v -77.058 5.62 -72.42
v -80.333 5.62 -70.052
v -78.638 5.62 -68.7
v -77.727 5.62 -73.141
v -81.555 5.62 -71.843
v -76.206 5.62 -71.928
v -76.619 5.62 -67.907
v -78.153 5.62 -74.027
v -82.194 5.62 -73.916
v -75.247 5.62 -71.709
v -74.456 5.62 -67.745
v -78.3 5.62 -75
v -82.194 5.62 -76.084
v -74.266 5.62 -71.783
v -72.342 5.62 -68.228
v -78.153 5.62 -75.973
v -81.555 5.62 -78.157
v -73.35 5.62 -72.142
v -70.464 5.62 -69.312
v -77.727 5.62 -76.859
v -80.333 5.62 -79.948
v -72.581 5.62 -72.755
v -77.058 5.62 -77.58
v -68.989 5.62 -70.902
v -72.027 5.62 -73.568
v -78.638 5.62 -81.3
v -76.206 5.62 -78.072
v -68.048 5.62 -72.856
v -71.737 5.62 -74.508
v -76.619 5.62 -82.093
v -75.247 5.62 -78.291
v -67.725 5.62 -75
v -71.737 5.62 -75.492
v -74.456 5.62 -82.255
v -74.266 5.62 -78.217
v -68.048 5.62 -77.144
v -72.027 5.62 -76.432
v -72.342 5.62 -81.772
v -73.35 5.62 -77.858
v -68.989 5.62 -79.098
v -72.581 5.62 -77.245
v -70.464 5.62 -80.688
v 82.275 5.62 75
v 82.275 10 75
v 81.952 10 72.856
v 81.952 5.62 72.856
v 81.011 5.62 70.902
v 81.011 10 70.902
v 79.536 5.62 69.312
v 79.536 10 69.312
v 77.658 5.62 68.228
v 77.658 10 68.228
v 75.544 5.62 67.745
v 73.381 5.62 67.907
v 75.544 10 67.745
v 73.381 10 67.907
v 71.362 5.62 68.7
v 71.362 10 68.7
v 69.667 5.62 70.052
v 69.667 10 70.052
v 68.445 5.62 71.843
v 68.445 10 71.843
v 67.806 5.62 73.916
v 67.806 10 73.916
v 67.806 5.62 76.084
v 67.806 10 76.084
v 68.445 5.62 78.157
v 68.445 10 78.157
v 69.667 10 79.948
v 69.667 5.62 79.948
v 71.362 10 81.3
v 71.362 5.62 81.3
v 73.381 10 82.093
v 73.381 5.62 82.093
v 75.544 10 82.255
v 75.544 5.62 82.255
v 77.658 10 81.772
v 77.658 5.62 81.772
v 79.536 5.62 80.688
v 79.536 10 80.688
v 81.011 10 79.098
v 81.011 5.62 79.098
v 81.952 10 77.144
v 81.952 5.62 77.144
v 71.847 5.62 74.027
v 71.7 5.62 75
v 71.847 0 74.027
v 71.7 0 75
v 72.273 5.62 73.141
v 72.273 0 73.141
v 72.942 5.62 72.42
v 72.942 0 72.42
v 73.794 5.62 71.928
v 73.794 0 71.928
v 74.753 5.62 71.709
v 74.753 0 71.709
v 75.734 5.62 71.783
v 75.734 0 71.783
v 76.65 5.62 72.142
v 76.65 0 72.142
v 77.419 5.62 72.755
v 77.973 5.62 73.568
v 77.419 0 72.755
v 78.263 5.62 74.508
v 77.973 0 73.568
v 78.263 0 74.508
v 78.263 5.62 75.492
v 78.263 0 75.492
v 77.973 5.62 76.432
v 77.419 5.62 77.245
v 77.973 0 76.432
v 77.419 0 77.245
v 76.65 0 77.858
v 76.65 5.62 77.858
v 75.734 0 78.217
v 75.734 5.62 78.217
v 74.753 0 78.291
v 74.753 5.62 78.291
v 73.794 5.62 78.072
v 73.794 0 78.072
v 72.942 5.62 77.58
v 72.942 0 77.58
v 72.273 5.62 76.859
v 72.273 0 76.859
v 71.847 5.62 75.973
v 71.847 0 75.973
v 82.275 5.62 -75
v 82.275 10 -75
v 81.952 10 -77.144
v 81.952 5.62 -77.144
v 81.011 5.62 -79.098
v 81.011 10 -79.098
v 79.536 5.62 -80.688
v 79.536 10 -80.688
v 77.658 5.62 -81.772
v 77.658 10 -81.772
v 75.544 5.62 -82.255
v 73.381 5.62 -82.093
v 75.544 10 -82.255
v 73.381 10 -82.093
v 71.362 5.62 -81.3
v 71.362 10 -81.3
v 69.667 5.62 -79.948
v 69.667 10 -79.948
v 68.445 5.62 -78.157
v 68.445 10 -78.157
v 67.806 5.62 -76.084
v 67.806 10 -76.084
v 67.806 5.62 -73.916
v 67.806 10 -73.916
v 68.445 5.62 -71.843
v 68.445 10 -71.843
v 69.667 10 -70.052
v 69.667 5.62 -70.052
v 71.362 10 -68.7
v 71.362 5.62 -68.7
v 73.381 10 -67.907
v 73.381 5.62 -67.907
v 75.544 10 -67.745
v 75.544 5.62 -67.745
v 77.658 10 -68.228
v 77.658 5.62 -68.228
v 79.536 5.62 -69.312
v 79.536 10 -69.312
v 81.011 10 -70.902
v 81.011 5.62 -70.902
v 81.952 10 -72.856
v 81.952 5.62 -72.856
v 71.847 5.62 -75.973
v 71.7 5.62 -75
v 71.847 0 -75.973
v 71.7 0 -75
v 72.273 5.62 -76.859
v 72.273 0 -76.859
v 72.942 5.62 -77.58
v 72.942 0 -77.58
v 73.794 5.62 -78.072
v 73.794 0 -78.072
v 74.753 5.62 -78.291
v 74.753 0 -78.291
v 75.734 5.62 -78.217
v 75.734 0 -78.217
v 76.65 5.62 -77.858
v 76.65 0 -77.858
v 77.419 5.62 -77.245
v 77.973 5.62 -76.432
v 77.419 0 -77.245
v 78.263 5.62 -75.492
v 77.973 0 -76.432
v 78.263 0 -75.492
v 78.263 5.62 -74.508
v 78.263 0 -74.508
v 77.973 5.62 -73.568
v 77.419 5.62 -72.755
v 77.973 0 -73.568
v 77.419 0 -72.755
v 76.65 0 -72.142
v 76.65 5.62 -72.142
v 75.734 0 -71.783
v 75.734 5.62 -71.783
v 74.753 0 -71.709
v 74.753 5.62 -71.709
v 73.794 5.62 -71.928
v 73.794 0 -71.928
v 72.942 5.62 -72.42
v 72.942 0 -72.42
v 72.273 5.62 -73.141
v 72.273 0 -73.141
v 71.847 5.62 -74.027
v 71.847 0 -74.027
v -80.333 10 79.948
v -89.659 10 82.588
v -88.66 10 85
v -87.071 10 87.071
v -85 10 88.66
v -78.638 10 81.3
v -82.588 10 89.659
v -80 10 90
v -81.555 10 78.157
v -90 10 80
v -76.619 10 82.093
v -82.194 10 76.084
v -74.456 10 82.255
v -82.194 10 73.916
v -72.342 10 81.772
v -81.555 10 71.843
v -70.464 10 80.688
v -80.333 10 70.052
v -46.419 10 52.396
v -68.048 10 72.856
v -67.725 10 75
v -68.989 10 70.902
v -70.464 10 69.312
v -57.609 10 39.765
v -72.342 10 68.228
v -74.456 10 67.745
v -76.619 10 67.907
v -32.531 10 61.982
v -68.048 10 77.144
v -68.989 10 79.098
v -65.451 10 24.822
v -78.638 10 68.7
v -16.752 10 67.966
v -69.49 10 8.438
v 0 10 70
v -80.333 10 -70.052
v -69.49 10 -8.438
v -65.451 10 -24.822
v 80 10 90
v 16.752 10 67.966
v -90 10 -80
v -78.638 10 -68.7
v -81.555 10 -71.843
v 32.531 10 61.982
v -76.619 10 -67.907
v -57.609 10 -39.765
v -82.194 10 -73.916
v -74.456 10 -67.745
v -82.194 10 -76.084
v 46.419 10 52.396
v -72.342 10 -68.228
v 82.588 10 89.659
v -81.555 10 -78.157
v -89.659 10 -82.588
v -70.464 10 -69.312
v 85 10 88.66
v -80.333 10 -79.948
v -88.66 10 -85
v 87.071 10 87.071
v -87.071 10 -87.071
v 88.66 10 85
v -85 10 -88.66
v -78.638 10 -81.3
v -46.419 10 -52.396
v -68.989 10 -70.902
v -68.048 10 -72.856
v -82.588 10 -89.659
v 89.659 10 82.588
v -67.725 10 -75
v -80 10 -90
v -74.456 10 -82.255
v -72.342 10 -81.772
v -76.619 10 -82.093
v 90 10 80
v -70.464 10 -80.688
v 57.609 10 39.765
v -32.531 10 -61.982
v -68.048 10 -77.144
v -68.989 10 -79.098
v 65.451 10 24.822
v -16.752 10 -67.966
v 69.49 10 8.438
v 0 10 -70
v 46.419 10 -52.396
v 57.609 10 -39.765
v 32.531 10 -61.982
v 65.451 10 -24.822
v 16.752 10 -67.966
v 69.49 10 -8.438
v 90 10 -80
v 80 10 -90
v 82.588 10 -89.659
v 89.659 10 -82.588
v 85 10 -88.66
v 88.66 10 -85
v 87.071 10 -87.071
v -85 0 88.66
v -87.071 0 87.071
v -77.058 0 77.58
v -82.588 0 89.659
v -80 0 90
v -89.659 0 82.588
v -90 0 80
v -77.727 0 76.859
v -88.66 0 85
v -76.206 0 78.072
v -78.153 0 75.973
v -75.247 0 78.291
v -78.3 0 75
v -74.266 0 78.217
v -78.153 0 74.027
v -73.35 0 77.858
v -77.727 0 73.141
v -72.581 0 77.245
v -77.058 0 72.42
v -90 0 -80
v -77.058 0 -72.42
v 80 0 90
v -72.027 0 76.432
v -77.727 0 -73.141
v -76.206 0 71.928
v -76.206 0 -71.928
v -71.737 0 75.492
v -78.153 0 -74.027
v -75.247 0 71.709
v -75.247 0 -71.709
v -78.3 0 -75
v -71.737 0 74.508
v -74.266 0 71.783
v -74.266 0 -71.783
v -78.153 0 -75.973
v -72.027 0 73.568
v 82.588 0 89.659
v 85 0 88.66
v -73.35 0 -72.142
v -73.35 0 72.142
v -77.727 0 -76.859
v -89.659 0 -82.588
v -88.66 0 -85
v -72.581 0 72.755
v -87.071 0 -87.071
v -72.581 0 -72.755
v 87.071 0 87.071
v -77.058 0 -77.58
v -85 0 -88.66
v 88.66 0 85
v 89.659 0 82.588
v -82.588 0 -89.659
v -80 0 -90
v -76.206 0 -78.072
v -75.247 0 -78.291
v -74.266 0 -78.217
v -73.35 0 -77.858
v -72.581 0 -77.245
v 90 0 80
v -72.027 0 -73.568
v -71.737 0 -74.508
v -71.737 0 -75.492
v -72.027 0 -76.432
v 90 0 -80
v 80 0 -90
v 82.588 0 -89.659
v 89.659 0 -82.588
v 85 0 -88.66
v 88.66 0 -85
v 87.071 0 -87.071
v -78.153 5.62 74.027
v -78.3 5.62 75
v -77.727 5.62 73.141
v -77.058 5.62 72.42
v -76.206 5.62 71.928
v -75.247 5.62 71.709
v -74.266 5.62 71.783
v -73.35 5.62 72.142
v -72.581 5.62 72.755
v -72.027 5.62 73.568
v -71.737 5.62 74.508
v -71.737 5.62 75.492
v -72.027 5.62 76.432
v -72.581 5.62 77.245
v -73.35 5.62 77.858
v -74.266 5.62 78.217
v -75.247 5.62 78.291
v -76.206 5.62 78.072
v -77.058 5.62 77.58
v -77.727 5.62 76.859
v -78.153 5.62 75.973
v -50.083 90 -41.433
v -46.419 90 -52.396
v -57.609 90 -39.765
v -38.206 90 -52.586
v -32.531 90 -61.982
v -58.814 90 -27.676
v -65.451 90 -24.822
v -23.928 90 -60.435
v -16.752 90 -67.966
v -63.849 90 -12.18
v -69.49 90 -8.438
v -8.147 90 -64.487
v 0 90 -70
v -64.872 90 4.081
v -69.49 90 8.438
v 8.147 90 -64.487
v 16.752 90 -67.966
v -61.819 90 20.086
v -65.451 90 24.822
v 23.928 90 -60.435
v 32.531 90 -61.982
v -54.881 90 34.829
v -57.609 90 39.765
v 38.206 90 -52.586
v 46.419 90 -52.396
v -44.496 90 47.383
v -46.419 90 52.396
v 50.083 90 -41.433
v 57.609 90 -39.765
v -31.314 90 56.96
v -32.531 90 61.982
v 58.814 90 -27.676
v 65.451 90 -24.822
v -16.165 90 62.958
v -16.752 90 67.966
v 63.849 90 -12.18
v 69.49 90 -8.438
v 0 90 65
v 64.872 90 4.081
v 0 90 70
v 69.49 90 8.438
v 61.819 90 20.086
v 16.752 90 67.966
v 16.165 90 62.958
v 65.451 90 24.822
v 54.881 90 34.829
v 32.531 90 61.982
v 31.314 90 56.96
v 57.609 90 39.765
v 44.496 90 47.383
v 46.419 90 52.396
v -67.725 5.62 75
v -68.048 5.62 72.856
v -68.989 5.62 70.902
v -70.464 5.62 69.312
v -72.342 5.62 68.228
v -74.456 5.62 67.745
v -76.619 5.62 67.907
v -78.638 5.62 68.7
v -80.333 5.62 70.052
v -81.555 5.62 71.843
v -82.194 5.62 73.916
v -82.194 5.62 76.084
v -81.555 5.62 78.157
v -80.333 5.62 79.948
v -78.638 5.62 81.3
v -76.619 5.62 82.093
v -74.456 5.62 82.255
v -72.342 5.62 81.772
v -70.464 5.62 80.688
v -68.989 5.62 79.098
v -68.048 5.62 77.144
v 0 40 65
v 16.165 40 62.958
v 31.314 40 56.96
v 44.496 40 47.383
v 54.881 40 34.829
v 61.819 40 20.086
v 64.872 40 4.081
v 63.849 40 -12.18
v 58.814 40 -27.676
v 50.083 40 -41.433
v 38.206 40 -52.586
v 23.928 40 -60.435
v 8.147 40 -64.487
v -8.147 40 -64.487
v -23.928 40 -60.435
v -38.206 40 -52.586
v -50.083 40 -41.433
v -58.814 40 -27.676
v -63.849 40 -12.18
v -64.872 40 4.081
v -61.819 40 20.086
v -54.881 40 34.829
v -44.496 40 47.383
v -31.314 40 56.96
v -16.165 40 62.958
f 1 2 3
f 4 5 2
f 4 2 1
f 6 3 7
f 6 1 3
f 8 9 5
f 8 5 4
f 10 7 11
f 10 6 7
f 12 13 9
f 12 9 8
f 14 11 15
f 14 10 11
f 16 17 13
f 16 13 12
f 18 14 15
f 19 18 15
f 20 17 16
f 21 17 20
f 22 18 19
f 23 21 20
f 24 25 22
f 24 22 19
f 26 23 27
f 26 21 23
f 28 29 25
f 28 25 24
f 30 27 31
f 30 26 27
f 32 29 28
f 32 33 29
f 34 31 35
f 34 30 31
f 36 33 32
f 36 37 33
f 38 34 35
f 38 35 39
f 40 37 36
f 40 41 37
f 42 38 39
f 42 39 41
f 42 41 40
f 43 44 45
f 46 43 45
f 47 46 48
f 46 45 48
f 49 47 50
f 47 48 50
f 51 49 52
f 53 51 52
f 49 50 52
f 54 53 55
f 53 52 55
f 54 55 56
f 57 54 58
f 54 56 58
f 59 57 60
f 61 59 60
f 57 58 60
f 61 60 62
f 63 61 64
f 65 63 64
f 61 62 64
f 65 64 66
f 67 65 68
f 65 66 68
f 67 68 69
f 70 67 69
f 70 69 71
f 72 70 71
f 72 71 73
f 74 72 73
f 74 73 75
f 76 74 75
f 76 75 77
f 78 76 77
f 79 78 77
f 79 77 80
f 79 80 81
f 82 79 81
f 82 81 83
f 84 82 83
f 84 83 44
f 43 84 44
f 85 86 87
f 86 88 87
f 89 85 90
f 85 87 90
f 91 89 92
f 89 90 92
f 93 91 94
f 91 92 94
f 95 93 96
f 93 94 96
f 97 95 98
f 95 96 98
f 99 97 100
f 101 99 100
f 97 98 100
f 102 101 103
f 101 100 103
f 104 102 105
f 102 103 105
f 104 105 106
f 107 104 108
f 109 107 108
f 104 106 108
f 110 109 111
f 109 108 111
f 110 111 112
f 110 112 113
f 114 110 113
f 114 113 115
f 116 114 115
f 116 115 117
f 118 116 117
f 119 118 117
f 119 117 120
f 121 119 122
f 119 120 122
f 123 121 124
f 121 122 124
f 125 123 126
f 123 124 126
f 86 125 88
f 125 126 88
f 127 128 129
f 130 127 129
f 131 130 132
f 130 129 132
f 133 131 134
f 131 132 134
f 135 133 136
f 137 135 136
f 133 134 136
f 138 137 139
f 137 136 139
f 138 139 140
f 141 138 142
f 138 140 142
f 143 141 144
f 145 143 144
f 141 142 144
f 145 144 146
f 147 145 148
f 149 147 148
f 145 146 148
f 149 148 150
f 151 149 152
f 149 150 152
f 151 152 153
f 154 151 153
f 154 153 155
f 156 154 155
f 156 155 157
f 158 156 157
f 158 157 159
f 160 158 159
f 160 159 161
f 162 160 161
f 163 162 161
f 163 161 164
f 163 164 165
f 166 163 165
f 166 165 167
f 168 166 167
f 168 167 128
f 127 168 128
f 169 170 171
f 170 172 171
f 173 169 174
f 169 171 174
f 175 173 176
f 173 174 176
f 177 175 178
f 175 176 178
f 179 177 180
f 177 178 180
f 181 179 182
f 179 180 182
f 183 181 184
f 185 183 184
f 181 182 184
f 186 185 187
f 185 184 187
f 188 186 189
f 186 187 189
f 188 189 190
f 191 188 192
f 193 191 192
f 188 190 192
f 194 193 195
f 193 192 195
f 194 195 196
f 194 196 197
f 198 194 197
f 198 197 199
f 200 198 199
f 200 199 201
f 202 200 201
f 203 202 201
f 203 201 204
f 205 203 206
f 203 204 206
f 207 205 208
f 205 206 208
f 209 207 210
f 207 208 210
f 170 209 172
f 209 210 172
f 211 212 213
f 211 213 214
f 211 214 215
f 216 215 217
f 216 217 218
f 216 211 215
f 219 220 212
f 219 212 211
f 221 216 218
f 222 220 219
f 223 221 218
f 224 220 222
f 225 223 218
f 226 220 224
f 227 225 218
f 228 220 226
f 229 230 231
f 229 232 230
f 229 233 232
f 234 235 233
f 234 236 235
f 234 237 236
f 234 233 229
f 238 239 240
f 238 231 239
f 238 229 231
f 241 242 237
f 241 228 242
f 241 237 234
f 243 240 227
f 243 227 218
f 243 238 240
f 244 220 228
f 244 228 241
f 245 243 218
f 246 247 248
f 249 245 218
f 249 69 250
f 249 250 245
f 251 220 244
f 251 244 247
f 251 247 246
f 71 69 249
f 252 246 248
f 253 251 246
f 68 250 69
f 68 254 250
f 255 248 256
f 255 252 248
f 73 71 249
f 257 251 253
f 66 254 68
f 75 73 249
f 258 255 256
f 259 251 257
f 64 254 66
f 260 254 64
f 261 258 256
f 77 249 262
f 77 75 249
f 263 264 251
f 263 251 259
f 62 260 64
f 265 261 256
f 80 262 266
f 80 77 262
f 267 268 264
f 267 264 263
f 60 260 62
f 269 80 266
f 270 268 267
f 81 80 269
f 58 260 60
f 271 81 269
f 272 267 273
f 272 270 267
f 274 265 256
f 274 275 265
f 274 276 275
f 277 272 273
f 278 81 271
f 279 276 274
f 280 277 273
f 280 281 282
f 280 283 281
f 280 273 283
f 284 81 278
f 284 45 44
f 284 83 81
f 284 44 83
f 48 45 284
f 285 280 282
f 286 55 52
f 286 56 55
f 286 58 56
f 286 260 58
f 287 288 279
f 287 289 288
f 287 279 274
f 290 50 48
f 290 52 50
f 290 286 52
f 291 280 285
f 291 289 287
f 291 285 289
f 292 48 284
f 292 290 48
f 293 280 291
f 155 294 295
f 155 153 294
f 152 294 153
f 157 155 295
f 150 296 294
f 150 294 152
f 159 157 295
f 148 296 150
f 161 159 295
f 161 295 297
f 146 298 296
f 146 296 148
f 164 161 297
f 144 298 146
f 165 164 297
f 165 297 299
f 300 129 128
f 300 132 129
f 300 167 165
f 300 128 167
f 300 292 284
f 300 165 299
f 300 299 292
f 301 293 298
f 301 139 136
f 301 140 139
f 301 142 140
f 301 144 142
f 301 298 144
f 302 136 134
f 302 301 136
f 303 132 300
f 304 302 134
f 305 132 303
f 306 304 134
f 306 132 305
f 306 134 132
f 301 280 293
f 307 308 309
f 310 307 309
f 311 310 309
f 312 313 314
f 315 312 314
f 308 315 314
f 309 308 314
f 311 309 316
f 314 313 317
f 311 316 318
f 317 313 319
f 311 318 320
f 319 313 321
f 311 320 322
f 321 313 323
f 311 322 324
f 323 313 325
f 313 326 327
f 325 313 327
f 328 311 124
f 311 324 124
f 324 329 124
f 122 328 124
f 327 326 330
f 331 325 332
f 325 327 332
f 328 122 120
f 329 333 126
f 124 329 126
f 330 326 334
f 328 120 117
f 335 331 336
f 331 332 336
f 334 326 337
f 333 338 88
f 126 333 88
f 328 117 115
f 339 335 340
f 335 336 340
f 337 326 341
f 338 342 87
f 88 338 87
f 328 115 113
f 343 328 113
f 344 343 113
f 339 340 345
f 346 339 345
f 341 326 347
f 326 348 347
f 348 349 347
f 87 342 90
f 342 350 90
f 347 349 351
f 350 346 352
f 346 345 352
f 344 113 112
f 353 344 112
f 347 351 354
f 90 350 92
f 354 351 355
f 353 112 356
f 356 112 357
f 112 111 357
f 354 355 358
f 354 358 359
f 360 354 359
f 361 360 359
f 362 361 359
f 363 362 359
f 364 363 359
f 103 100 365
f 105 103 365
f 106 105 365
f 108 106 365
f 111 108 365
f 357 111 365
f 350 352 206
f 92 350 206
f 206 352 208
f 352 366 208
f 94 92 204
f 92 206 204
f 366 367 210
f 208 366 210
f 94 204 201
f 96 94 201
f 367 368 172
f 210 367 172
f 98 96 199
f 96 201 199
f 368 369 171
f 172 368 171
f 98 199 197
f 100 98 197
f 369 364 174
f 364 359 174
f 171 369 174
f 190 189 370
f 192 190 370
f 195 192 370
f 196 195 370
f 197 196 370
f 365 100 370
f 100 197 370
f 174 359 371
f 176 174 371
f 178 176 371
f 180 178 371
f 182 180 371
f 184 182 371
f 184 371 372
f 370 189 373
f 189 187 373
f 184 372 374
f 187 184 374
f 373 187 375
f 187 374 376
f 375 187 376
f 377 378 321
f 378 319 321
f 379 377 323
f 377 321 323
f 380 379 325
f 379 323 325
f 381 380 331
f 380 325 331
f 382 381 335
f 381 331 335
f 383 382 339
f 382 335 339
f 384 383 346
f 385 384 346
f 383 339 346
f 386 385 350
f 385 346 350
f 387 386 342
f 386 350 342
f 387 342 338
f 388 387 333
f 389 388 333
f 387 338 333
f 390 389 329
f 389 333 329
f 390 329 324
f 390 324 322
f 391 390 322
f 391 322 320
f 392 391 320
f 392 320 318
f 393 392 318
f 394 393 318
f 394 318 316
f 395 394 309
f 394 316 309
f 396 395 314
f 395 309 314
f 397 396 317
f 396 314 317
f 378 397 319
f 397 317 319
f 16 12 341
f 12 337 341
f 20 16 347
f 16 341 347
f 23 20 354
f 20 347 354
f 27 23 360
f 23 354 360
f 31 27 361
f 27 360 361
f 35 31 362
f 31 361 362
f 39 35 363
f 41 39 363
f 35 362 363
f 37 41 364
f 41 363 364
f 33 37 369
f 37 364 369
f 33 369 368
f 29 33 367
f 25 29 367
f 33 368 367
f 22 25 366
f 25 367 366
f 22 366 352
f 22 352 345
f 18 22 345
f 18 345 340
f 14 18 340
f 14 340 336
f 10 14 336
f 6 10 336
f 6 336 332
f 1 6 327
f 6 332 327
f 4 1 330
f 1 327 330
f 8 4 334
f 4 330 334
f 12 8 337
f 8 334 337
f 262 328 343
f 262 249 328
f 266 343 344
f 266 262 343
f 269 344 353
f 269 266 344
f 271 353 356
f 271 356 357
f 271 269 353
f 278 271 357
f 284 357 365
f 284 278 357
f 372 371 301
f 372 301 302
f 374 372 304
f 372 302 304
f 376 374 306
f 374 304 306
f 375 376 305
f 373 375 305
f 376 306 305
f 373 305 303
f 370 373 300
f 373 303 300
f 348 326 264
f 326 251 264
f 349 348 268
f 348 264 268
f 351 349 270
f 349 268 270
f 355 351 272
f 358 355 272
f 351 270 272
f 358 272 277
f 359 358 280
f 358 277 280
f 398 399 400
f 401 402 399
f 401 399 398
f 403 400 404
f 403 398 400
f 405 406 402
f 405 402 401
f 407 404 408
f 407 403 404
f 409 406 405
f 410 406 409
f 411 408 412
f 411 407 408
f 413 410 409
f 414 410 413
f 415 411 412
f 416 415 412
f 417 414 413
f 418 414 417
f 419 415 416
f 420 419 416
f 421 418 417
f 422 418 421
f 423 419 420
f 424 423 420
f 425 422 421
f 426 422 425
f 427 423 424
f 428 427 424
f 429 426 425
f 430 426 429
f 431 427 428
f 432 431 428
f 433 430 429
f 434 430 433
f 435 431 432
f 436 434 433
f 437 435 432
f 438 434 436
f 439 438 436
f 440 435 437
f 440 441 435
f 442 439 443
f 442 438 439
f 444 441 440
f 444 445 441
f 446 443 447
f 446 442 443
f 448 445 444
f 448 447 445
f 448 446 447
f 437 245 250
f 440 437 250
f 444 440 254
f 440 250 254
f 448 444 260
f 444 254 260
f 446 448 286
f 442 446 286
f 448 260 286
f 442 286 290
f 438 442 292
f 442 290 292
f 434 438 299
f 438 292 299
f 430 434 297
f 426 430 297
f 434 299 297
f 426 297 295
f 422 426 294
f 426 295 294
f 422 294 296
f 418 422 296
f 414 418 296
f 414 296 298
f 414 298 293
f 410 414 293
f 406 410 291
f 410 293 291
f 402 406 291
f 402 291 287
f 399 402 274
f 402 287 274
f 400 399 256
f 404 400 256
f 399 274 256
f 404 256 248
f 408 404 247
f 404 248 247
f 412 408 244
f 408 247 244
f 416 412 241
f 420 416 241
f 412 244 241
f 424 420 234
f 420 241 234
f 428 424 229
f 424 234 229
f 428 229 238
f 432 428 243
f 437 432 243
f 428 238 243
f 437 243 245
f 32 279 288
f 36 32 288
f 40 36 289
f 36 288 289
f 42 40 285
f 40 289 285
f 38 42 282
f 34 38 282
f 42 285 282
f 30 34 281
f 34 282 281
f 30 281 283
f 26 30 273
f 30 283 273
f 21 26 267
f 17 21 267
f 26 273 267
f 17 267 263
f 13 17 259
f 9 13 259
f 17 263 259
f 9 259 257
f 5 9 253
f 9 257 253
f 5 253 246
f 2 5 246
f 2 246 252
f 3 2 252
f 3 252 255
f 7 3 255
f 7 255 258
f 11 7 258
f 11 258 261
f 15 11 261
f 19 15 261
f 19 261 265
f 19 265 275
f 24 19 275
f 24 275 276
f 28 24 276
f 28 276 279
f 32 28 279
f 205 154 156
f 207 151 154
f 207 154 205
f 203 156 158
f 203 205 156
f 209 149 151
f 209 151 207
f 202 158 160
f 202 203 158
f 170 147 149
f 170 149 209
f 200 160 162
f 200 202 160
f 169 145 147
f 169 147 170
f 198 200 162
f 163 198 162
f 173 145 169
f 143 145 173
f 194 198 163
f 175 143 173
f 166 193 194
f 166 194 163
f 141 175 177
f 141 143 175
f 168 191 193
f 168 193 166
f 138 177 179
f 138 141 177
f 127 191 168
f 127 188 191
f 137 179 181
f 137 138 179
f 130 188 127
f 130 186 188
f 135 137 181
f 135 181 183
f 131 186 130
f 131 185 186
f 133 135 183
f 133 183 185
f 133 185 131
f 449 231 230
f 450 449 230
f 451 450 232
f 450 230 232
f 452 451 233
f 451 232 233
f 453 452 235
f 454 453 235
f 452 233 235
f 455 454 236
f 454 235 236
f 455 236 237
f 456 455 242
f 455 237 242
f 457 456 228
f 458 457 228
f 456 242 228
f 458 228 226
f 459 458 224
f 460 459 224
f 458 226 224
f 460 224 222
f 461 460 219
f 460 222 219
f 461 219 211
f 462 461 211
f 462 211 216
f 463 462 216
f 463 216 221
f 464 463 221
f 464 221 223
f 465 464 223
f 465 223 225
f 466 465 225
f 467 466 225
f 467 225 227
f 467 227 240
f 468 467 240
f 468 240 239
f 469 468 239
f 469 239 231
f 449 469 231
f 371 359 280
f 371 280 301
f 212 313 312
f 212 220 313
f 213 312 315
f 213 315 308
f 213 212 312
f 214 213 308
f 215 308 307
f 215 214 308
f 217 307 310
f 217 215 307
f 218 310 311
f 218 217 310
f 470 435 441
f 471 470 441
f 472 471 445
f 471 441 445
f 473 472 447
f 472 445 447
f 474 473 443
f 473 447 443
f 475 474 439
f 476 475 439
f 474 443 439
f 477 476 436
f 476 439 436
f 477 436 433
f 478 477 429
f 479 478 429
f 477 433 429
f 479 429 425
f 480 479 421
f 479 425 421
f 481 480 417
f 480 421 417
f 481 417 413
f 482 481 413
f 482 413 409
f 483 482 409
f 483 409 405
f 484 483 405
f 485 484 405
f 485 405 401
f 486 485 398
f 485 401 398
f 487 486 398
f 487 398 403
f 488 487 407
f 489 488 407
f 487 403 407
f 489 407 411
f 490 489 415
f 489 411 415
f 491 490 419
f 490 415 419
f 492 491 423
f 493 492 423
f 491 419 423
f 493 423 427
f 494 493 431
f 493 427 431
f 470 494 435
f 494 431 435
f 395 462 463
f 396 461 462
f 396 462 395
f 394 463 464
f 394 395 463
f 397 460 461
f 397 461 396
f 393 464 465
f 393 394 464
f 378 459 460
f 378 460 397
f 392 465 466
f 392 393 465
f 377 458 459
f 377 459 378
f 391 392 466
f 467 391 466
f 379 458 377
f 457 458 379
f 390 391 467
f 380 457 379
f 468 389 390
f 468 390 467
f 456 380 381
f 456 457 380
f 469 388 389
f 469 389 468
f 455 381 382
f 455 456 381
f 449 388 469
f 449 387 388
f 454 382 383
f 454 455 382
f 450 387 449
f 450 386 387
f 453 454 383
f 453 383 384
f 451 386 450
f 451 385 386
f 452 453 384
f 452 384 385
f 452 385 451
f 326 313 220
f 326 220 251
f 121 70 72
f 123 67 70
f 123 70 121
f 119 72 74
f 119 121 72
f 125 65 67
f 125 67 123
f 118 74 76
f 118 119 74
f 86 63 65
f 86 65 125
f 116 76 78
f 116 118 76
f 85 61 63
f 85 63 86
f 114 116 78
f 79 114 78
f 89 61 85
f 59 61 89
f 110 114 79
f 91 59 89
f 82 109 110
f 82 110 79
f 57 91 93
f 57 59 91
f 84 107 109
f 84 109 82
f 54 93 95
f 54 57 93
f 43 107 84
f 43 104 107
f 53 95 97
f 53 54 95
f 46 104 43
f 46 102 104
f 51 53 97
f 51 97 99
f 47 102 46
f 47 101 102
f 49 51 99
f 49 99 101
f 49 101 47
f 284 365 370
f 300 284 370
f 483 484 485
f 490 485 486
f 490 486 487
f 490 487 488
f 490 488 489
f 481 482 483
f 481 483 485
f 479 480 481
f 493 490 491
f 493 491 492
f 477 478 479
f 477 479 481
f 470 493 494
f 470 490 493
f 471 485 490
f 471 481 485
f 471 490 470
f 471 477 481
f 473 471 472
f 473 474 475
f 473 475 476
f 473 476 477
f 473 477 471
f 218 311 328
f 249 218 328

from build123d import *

# Parameters (mm, degrees)
SKETCH4_W                               = 180
SKETCH4_H                               = 180
BOSS_EXTRUDE2_DEPTH                     = 10
SKETCH5_R                               = 70
BOSS_EXTRUDE3_DEPTH                     = 80
SKETCH7_R                               = 65
CUT_EXTRUDE1_DEPTH                      = 50
CBORE_FOR_M6_HEX_HEAD_BOLT2_D           = 6.6
CBORE_FOR_M6_HEX_HEAD_BOLT2_CBORE_D     = 14.55
CBORE_FOR_M6_HEX_HEAD_BOLT2_CBORE_DEPTH = 4.38
FILLET1_R                               = 10


with BuildPart() as part:
    # Sketch4 → Boss-Extrude2 (new body)
    with BuildSketch(Plane(origin=(0, 0, 0), x_dir=(1, 0, 0), z_dir=(0, 1, 0))):
        Rectangle(SKETCH4_W, SKETCH4_H)
    extrude(amount=BOSS_EXTRUDE2_DEPTH)

    # Sketch5 → Boss-Extrude3 (add)
    with BuildSketch(Plane(origin=(0, 10, 0), x_dir=(1, 0, 0), z_dir=(0, 1, 0))):
        with Locations(Location((0, 0, 0), (0, 0, 270))):
            Circle(SKETCH5_R)
    extrude(amount=BOSS_EXTRUDE3_DEPTH)

    # Sketch7 → Cut-Extrude1 (cut)
    with BuildSketch(Plane(origin=(0, 90, 0), x_dir=(1, 0, 0), z_dir=(0, 1, 0))):
        with Locations(Location((0, 0, 0), (0, 0, 270))):
            Circle(SKETCH7_R)
    extrude(amount=-CUT_EXTRUDE1_DEPTH, mode=Mode.SUBTRACT)

    # CBORE for M6 Hex Head Bolt2 (through all)
    with Locations(Plane(origin=(0, 10, 0), x_dir=(1, 0, 0), z_dir=(0, 1, 0))):
        with Locations((-75, 75), (75, 75), (75, -75), (-75, -75)):
            CounterBoreHole(CBORE_FOR_M6_HEX_HEAD_BOLT2_D / 2, CBORE_FOR_M6_HEX_HEAD_BOLT2_CBORE_D / 2, CBORE_FOR_M6_HEX_HEAD_BOLT2_CBORE_DEPTH)

    # Fillet1
    fillet1_edges = [part.edges().sort_by_distance(p)[0] for p in [
        (90, 5, 90),
        (-90, 5, 90),
        (-90, 5, -90),
        (90, 5, -90),
    ]]
    fillet(fillet1_edges, radius=FILLET1_R)


solid = part.part
